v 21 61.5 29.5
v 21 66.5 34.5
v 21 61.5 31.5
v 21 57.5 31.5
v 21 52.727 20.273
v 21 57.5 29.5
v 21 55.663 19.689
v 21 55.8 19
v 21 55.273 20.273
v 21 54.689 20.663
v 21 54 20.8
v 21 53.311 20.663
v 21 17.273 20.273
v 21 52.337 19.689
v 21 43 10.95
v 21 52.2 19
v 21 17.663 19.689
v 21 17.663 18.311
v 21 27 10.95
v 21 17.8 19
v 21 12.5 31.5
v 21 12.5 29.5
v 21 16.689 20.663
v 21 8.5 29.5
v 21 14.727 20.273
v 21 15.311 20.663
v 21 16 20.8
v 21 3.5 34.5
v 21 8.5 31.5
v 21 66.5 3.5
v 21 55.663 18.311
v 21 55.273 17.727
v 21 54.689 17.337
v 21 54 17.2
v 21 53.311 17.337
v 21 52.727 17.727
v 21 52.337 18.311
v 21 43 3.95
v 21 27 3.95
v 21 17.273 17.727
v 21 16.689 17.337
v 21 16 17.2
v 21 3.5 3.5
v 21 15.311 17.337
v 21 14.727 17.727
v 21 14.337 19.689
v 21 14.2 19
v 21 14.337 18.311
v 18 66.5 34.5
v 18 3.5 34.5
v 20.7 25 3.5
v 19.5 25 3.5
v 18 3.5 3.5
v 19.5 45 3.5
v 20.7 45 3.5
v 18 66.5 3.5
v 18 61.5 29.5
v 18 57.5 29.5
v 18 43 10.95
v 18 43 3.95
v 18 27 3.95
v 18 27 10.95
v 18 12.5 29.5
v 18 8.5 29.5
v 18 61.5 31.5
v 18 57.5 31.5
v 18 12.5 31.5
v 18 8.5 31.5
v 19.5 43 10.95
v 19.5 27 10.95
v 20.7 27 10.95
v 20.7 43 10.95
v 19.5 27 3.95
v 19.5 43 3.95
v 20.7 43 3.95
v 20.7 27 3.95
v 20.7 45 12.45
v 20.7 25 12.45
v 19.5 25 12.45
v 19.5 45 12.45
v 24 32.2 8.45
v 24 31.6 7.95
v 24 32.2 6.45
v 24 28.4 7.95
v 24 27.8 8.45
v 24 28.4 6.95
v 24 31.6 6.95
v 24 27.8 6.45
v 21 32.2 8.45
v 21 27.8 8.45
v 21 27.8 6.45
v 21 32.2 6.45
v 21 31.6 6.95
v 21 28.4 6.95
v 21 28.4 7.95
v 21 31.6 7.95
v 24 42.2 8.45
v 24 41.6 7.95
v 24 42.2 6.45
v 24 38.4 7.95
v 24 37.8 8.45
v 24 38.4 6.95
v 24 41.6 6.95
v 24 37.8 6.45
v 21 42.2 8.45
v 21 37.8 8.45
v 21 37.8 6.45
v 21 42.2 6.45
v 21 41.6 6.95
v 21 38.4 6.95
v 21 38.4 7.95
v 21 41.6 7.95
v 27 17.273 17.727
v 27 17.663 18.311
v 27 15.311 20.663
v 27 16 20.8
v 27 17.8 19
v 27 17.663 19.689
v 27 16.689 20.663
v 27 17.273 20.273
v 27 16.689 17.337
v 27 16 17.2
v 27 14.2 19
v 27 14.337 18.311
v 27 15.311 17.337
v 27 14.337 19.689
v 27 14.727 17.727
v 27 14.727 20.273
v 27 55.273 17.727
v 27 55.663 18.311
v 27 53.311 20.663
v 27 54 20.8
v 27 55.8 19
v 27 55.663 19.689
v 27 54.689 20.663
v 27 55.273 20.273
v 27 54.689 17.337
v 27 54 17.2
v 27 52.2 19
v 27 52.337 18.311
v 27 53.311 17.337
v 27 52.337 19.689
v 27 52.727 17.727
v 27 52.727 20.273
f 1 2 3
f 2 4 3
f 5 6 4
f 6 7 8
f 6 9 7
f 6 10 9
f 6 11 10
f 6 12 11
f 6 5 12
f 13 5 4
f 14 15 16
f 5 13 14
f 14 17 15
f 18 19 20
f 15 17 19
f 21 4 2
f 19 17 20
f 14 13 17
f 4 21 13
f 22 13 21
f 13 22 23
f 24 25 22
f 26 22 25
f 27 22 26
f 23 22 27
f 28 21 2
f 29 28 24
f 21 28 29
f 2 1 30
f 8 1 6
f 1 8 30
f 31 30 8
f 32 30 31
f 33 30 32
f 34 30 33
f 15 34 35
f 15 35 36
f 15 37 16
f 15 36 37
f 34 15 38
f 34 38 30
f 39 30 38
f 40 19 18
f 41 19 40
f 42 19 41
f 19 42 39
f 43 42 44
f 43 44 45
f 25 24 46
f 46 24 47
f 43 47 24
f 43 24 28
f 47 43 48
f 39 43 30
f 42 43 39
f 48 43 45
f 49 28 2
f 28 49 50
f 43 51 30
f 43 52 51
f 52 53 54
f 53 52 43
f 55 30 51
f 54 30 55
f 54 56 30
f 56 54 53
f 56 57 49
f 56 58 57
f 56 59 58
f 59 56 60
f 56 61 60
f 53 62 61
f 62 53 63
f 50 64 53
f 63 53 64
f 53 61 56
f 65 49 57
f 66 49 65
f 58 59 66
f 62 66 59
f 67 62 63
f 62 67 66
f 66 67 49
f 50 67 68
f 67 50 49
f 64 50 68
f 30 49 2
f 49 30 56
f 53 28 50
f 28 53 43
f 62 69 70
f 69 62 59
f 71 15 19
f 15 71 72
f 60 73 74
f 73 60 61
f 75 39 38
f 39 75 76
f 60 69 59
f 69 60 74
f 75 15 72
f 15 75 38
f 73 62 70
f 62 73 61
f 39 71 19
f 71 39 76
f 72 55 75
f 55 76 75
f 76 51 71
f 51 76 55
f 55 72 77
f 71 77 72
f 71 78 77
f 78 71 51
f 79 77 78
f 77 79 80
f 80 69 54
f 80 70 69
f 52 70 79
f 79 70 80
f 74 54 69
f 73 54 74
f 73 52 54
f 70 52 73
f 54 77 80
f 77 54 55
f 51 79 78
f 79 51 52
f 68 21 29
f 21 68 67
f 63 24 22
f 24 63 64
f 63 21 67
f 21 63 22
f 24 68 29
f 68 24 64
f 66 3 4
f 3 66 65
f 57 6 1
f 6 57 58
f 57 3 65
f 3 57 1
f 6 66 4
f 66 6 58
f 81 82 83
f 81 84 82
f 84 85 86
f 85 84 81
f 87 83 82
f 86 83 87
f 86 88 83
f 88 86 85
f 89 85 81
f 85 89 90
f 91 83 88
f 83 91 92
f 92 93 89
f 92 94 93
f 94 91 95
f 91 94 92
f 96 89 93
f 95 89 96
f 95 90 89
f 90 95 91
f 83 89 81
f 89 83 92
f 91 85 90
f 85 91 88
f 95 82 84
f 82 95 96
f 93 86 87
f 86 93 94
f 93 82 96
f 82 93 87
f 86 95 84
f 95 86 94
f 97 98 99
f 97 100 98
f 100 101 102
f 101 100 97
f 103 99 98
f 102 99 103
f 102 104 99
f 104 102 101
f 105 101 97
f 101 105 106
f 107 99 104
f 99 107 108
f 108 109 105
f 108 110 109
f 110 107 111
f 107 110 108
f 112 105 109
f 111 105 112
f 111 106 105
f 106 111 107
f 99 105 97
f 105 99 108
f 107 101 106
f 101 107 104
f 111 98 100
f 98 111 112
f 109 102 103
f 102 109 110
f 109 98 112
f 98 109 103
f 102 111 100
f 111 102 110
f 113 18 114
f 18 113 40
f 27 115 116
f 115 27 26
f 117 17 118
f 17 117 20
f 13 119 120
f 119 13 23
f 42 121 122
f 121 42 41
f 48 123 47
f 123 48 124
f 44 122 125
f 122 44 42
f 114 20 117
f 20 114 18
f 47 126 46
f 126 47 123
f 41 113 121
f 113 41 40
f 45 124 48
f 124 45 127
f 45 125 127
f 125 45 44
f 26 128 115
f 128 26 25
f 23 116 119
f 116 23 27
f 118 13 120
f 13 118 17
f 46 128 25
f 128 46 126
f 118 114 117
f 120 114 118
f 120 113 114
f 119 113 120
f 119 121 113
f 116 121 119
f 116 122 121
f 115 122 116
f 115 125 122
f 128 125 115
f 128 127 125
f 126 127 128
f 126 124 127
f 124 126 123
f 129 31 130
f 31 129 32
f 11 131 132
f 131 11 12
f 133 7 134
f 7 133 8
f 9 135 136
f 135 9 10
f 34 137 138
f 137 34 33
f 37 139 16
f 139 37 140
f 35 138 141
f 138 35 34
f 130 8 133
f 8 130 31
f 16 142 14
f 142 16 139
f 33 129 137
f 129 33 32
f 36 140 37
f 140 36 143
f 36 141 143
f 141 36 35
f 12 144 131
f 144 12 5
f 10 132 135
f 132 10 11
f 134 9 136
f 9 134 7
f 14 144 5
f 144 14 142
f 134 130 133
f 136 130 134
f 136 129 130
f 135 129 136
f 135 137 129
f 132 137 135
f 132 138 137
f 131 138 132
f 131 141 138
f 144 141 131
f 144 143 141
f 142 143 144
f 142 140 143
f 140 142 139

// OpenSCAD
// file: ../../00_common/screw_bosses.scad
// =============================================================================
// OpenMotorBridge - Screw Bosses & Fastener Primitives
// =============================================================================
// File: hardware/cad/scad/00_common/screw_bosses.scad
// Description: Reusable parametric modules for screw standoffs, corner clamping
//              posts, and mounting ears.
// =============================================================================

include <parameters.scad>;

// 1. Cylindrical Screw Standoff Boss (with center hole)
module screw_boss(outer_r=2.5, inner_r=1.2, h=5.0) {
    difference() {
        cylinder(r=outer_r, h=h, center=false);
        translate([0, 0, -0.1])
            cylinder(r=inner_r, h=h + 0.2, center=false);
    }
}

// 2. Rectangular Corner Clamping Post (with center screw hole)
module corner_screw_post(size_x=5.0, size_y=5.0, h=12.0, hole_r=1.65, hole_h=10.0, hole_offset_z=2.0) {
    difference() {
        cube(size=[size_x, size_y, h], center=false);
        translate([size_x/2.0, size_y/2.0, hole_offset_z])
            cylinder(r=hole_r, h=hole_h + 0.1, center=false);
    }
}

// 3. M4 Silentblock Outer Mounting Ear (Centered in Y around y=0, extends along +X)
module mounting_ear_m4(ear_len=14.0, ear_w=12.0, ear_h=5.0, hole_r=2.2) {
    difference() {
        union() {
            translate([0, -ear_w/2.0, 0])
                cube(size=[ear_len - ear_w/2.0, ear_w, ear_h], center=false);
            translate([ear_len - ear_w/2.0, 0, 0])
                cylinder(r=ear_w/2.0, h=ear_h, center=false);
        }
        translate([ear_len - ear_w/2.0, 0, -0.1])
            cylinder(r=hole_r, h=ear_h + 0.2, center=false);
    }
}

// 4. Captive Hex Nut Pocket (DIN 934 / DIN 985 with center screw through-hole)
module hex_nut_pocket(sw=NUT_M4_SW, h=NUT_M4_H, screw_r=M4_SCREW_HOLE_R, through_h=10.0) {
    // Hexagonal pocket (flat-to-flat SW converted to circle radius: r = sw / sqrt(3))
    hex_r = sw / sqrt(3);
    union() {
        // Hexagonal nut pocket
        cylinder(r=hex_r, h=h, center=false, $fn=6);
        // Screw clearance through-hole
        translate([0, 0, -through_h/2.0])
            cylinder(r=screw_r, h=through_h + h, center=false, $fn=30);
    }
}
// file: ../../00_common/parameters.scad
// =============================================================================
// OpenMotorBridge - Global CAD Parameters & Settings
// =============================================================================
// File: hardware/cad/scad/00_common/parameters.scad
// Description: Global dimensional constants, manufacturing clearances and
//              circle resolution ($fn) for all OpenSCAD modules.
// =============================================================================

// --- 1. Circle & Curve Resolution ---
$fn = 60; // Smooth cylinders and holes for high-quality MJF 3D printing

// --- 2. Central Main Box Dimensions (3-Tier Sandwich) ---
MAIN_BOX_OUTER_L      = 110.0; // Outer length in X (mm)
MAIN_BOX_OUTER_W      = 74.0;  // Outer width in Y (mm)
MAIN_BOX_LOWER_H      = 17.0;  // Lower case height in Z (mm)
MAIN_BOX_MID_H        = 15.0;  // Mid tray height in Z (mm)
MAIN_BOX_LID_H        = 4.0;   // Lid plate thickness in Z (mm)
MAIN_BOX_WALL         = 2.5;   // Nominal wall thickness (mm)
MAIN_BOX_CORNER_POST  = 7.0;   // Corner clamping screw post size (mm, for M3 hex nut pockets)

// --- 3. Satellite Pod Dimensions (Universal Enlarged Envelope) ---
POD_OUTER_L           = 150.0; // Outer length in X (mm, standardized for serial PCBA 03 + Cardo/Sena/OMM)
POD_OUTER_W           = 70.0;  // Outer width in Y (mm)
POD_OUTER_H           = 38.0;  // Outer height in Z (mm)
POD_WALL              = 3.5;   // Nominal wall thickness (mm)
POD_BULKHEAD_X        = 18.0;  // Partition bulkhead position in X (mm)
POD_CHAMBER_L         = 132.0; // Sliding chamber length in X (mm, clears 130mm sled + 2mm margin)
POD_CHAMBER_W         = 63.0;  // Sliding chamber width in Y (mm)
POD_CHAMBER_H         = 31.0;  // Sliding chamber height in Z (mm)

// --- 4. Pod Linear Guide Rails (Poka-Yoke Tongue & Groove) ---
POD_GROOVE_W          = 3.0;   // Internal guide groove width in Z (mm)
POD_GROOVE_DEPTH      = 1.5;   // Internal guide groove depth in Y (mm)
POD_GROOVE_LEFT_Z     = 10.0;  // Center height of left groove (mm)
POD_GROOVE_RIGHT_Z    = 18.0;  // Center height of right groove (mm, asym offset)

CARTRIDGE_TONGUE_W    = 2.6;   // Cartridge tongue rail height in Z (mm, 0.2mm clearance)
CARTRIDGE_TONGUE_PROT = 1.4;   // Cartridge tongue protrusion in Y (mm, 0.1mm clearance)
CARTRIDGE_CHAMFER_L   = 4.0;   // 30° lead-in chamfer nose length (mm)

// --- 5. Cartridge Dimensions (Enlarged Universal Sled) ---
CARTRIDGE_BASE_L      = 130.0; // Sled length in X (mm, accommodates PCBA 03 + OEM Cardo Air-Mount/Sena/OMM serial layout)
CARTRIDGE_BASE_W      = 58.0;  // Sled width in Y (mm)
CARTRIDGE_BASE_H      = 28.0;  // Sled height in Z (mm)
CARTRIDGE_FACE_L      = 4.0;   // Front faceplate thickness in X (mm)
CARTRIDGE_FACE_W      = 64.0;  // Front faceplate width in Y (mm)
CARTRIDGE_FACE_H      = 34.0;  // Front faceplate height in Z (mm)

// --- 5a. RF Interface & Sealing Dimensions ---
SMA_BORE_R            = 3.25;  // Ø 6.5 mm through-hole for standard SMA bulkhead
SMA_ORECESS_R         = 4.75;  // Ø 9.5 mm recess for waterproof silicone O-ring
SMA_ORECESS_DEPTH     = 1.2;   // 1.2 mm deep O-ring compression pocket

// --- 5b. Magnetic Anti-Theft Lock System ---
LATCH_PIVOT_X         = 65.0;  // Center pivot position along sled X (mm, centered on 130mm sled)
LATCH_MAGNET_X        = 53.0;  // Ferromagnetic anchor position along sled X (mm)
LATCH_TOOTH_X         = 77.0;  // Locking sawtooth pawl position along sled X (mm)
LATCH_ARM_H           = 6.0;   // Rocker lever height in Z (mm)
LATCH_ARM_THICK       = 2.6;   // Rocker beam thickness in Y (mm)
LATCH_MAGNET_PIN_DIA  = 6.2;   // Bore for Ø 6.0 mm steel dowel pin (mm)
LATCH_SPRING_DIA      = 3.8;   // Bore for Ø 3.5 mm return compression spring (mm)

// --- 6. Standard Captive Hex Nut Pockets (DIN 934 / DIN 985 with +0.2 mm MJF/FDM clearance) ---
NUT_M2_SW             = 4.2;   // M2 across flats (nominal 4.0 mm)
NUT_M2_H              = 1.8;   // M2 thickness (nominal 1.6 mm)
NUT_M2_5_SW           = 5.2;   // M2.5 across flats (nominal 5.0 mm)
NUT_M2_5_H            = 2.2;   // M2.5 thickness (nominal 2.0 mm)
NUT_M3_SW             = 5.7;   // M3 across flats (nominal 5.5 mm)
NUT_M3_H              = 2.6;   // M3 thickness (nominal 2.4 mm)
NUT_M4_SW             = 7.2;   // M4 across flats (nominal 7.0 mm)
NUT_M4_H              = 3.4;   // M4 thickness (nominal 3.2 mm)
NUT_M5_SW             = 8.2;   // M5 across flats (nominal 8.0 mm)
NUT_M5_H              = 4.2;   // M5 thickness (nominal 4.0 mm)

// Direct Plastic Thread-Forming / Self-Tapping Pilot Holes in PA12 (100% Soldering-Iron Free)
M2_PILOT_HOLE_R       = 0.85;  // Core hole for M2 screws in PA12 (Ø 1.7 mm)
M2_5_PILOT_HOLE_R     = 1.05;  // Core hole for M2.5 screws in PA12 (Ø 2.1 mm)
M3_PILOT_HOLE_R       = 1.25;  // Core hole for M3 screws in PA12 (Ø 2.5 mm)

// --- 7. Screw & Clearance Dimensions ---
M2_SCREW_HOLE_R       = 1.1;   // M2 clearance hole (r = 1.1 mm -> Ø 2.2 mm)
M2_5_SCREW_HOLE_R     = 1.4;   // M2.5 clearance hole (r = 1.4 mm -> Ø 2.8 mm)
M3_SCREW_HOLE_R       = 1.65;  // M3 clearance hole (r = 1.65 mm -> Ø 3.3 mm)
M4_SCREW_HOLE_R       = 2.2;   // M4 clearance hole (r = 2.2 mm -> Ø 4.4 mm)
M8_BORE_R             = 4.0;   // M8 cable through-bore (r = 4.0 mm -> Ø 8.0 mm)
M8_STUDS_OUTER_R      = 6.0;   // M8 neck outer radius (Ø 12.0 mm)

// --- 8. Universal Front Node Enclosure Dimensions (Type E: 98 x 68 x 25 mm) ---
FRONT_NODE_PCB_L      = 82.0;  // PCB length in X (mm, PCBA 05)
FRONT_NODE_PCB_W      = 50.0;  // PCB width in Y (mm, PCBA 05)
FRONT_NODE_PCB_H      = 1.6;   // PCB thickness in Z (mm)
FRONT_NODE_PCB_R      = 2.5;   // PCB corner radius (mm)

FRONT_NODE_CHAMBER_L  = 86.0;  // Internal chamber length in X (mm, 2mm margin per side)
FRONT_NODE_CHAMBER_W  = 56.0;  // Internal chamber width in Y (mm, 3mm margin per side)
FRONT_NODE_TUB_H      = 17.5;  // Lower tub depth in Z (mm)
FRONT_NODE_LID_H      = 7.5;   // Upper lid height in Z (mm)
FRONT_NODE_WALL       = 2.5;   // Wall thickness in HP MJF PA12 (mm)
FRONT_NODE_CORNER_R   = 4.0;   // Outer enclosure corner radius (mm)

FRONT_NODE_OUTER_L    = FRONT_NODE_CHAMBER_L + 2 * FRONT_NODE_WALL + 7.0; // 98.0 mm
FRONT_NODE_OUTER_W    = FRONT_NODE_CHAMBER_W + 2 * FRONT_NODE_WALL + 7.0; // 68.0 mm
FRONT_NODE_OUTER_H    = FRONT_NODE_TUB_H + FRONT_NODE_LID_H;              // 25.0 mm

// PCB Standoff Heights & Radii (100% Soldering-Iron Free)
FRONT_NODE_STANDOFF_H = 3.0;   // Height of PCB standoffs from floor (mm)
FRONT_NODE_STANDOFF_R = 3.0;   // Outer radius of M2.5 screw bosses (mm)
FRONT_NODE_CORE_HOLE_R= M2_5_PILOT_HOLE_R; // Core hole for direct M2.5 screw engagement (Ø 2.1 mm)

// AMPS 4-Hole Mounting Pattern (38 x 30 mm with DIN 934 M4 Captive Nut Pockets)
AMPS_SPACING_X        = 38.0;  // AMPS hole distance in X (mm)
AMPS_SPACING_Y        = 30.0;  // AMPS hole distance in Y (mm)
AMPS_NUT_SW           = NUT_M4_SW; // Captive M4 hex nut pocket across flats (7.2 mm)
AMPS_NUT_H            = NUT_M4_H;  // Captive M4 hex nut pocket depth (3.4 mm)

// Acoustic Vent for Knowles SPH0645 MEMS
FRONT_NODE_MIC_HOLE_R = 1.25;  // Sound canal radius (Ø 2.5 mm)
FRONT_NODE_MIC_MEMB_R = 3.0;   // Gore ePTFE membrane pocket radius (Ø 6.0 mm)
FRONT_NODE_MIC_MEMB_D = 0.8;   // Membrane pocket depth (mm)
// main file
// =============================================================================
// OpenMotorBridge - Satellite Pod: Monolithic Bulkhead & Contact Interface
// =============================================================================
// File: hardware/cad/scad/02_pod_base/parts/002_pod_bulkhead_partition.scad
// Description: 100% Monolithic, screw-free partition wall integrated directly
//              into the 1-piece pod base housing (zero assembly screws!).
//              Features:
//              - Form-fitting aperture for CON_POD_DC (IP67 2-pin automotive
//                blade direct plug with NBR70 O-ring & stainless steel U-clip).
//              - 2x Gold-plated blade contact feedthroughs (2.8 x 0.8 mm blades,
//                10.0 mm pitch: Y = 30.0 mm for +12V/5V and Y = 40.0 mm for GND,
//                mating into J_DC_IN dual-beam slot socket on PCBA 03).
//              - 2x Auto-Eject spring guide posts (for Ø 4.5 mm V4A springs at
//                Y = 16.0 mm and Y = 54.0 mm).
//              - Hermetic internal partition isolating the rear cable chamber
//                from the front slide chamber.
// =============================================================================

include <../../00_common/parameters.scad>;
include <../../00_common/screw_bosses.scad>;

module pod_bulkhead_assembly(bulkhead_x=18.0, wall=3.5) {
    // Z = 7.45 mm: Exactly aligns with the horizontal centerline of J_DC_IN dual-beam slot socket
    // (POD_WALL 3.5 mm + Sled Floor 2.5 mm + M2 Standoff Boss 2.5 mm - 1.05 mm socket slot offset = 7.45 mm)
    z_contacts = wall + 2.5 + 2.5 - 1.05;

    // 1. Monolithic Vertical Partition Wall (Fused directly into tunnel at x = 18.0 mm)
    translate([bulkhead_x, wall, wall]) {
        difference() {
            // Solid transverse bulkhead (3.0 mm thickness)
            cube(size=[3.0, POD_OUTER_W - 2*wall, POD_OUTER_H - 2*wall], center=false);

            // Central Keyed Aperture for CON_POD_DC IP67 Blade Plug (10.0 mm pitch)
            // Centered at Y = 35.0 mm (Y_rel = 35.0 - wall), Z = z_contacts
            translate([-0.5, (POD_OUTER_W - 2*wall)/2.0 - 8.0, z_contacts - wall - 3.5])
                cube(size=[4.0, 16.0, 7.0], center=false);

            // Transverse U-Retaining Clip Retention Slot (1.2 mm wide x 18.0 mm tall)
            translate([1.5, (POD_OUTER_W - 2*wall)/2.0 - 10.0, z_contacts - wall - 5.0])
                cube(size=[1.2, 20.0, 10.0], center=false);

            // 2x Convective Pressure Equalization Vents (Left & Right top corners)
            translate([-0.5, 5.0, POD_OUTER_H - 2*wall - 5.0])
                cube(size=[4.0, 4.0, 2.0], center=false);
            translate([-0.5, POD_OUTER_W - 2*wall - 9.0, POD_OUTER_H - 2*wall - 5.0])
                cube(size=[4.0, 4.0, 2.0], center=false);
        }
    }

    // 2. 2x Low-Profile Blade Alignment Sleeves (projecting +X into cartridge entry window)
    // Low-profile Z = 2.0 mm (Z = 6.45 .. 8.45 mm, guaranteed 0.05 mm clearance under B.Cu at Z = 8.50 mm)
    translate([bulkhead_x + 3.0, 30.0, z_contacts]) {
        difference() {
            // Chamfered protective guide nose (low-profile h = 2.0 mm, w = 4.4 mm)
            translate([0, -2.2, -1.0])
                cube([3.0, 4.4, 2.0], center=false);
            // 2.8 x 0.8 mm Blade Pass-Through with lead-in chamfer
            translate([-0.5, -1.6, -0.5])
                cube([4.0, 3.2, 1.0], center=false);
        }
    }
    translate([bulkhead_x + 3.0, 40.0, z_contacts]) {
        difference() {
            // Chamfered protective guide nose (low-profile h = 2.0 mm, w = 4.4 mm)
            translate([0, -2.2, -1.0])
                cube([3.0, 4.4, 2.0], center=false);
            // 2.8 x 0.8 mm Blade Pass-Through with lead-in chamfer
            translate([-0.5, -1.6, -0.5])
                cube([4.0, 3.2, 1.0], center=false);
        }
    }

    // 3. 2x Auto-Eject Spring Retainer Posts (for Ø 4.5 mm V4A Springs at Y = 16.0 and Y = 54.0)
    // Symmetrical ±19.0 mm from pod centerline (Y = 35.0 mm)
    translate([bulkhead_x + 3.0, 16.0, POD_OUTER_H/2.0])
        rotate([0, 90, 0])
            cylinder(r=1.8, h=6.0, $fn=16);

    translate([bulkhead_x + 3.0, POD_OUTER_W - 16.0, POD_OUTER_H/2.0])
        rotate([0, 90, 0])
            cylinder(r=1.8, h=6.0, $fn=16);
}

// Standalone preview
pod_bulkhead_assembly();
